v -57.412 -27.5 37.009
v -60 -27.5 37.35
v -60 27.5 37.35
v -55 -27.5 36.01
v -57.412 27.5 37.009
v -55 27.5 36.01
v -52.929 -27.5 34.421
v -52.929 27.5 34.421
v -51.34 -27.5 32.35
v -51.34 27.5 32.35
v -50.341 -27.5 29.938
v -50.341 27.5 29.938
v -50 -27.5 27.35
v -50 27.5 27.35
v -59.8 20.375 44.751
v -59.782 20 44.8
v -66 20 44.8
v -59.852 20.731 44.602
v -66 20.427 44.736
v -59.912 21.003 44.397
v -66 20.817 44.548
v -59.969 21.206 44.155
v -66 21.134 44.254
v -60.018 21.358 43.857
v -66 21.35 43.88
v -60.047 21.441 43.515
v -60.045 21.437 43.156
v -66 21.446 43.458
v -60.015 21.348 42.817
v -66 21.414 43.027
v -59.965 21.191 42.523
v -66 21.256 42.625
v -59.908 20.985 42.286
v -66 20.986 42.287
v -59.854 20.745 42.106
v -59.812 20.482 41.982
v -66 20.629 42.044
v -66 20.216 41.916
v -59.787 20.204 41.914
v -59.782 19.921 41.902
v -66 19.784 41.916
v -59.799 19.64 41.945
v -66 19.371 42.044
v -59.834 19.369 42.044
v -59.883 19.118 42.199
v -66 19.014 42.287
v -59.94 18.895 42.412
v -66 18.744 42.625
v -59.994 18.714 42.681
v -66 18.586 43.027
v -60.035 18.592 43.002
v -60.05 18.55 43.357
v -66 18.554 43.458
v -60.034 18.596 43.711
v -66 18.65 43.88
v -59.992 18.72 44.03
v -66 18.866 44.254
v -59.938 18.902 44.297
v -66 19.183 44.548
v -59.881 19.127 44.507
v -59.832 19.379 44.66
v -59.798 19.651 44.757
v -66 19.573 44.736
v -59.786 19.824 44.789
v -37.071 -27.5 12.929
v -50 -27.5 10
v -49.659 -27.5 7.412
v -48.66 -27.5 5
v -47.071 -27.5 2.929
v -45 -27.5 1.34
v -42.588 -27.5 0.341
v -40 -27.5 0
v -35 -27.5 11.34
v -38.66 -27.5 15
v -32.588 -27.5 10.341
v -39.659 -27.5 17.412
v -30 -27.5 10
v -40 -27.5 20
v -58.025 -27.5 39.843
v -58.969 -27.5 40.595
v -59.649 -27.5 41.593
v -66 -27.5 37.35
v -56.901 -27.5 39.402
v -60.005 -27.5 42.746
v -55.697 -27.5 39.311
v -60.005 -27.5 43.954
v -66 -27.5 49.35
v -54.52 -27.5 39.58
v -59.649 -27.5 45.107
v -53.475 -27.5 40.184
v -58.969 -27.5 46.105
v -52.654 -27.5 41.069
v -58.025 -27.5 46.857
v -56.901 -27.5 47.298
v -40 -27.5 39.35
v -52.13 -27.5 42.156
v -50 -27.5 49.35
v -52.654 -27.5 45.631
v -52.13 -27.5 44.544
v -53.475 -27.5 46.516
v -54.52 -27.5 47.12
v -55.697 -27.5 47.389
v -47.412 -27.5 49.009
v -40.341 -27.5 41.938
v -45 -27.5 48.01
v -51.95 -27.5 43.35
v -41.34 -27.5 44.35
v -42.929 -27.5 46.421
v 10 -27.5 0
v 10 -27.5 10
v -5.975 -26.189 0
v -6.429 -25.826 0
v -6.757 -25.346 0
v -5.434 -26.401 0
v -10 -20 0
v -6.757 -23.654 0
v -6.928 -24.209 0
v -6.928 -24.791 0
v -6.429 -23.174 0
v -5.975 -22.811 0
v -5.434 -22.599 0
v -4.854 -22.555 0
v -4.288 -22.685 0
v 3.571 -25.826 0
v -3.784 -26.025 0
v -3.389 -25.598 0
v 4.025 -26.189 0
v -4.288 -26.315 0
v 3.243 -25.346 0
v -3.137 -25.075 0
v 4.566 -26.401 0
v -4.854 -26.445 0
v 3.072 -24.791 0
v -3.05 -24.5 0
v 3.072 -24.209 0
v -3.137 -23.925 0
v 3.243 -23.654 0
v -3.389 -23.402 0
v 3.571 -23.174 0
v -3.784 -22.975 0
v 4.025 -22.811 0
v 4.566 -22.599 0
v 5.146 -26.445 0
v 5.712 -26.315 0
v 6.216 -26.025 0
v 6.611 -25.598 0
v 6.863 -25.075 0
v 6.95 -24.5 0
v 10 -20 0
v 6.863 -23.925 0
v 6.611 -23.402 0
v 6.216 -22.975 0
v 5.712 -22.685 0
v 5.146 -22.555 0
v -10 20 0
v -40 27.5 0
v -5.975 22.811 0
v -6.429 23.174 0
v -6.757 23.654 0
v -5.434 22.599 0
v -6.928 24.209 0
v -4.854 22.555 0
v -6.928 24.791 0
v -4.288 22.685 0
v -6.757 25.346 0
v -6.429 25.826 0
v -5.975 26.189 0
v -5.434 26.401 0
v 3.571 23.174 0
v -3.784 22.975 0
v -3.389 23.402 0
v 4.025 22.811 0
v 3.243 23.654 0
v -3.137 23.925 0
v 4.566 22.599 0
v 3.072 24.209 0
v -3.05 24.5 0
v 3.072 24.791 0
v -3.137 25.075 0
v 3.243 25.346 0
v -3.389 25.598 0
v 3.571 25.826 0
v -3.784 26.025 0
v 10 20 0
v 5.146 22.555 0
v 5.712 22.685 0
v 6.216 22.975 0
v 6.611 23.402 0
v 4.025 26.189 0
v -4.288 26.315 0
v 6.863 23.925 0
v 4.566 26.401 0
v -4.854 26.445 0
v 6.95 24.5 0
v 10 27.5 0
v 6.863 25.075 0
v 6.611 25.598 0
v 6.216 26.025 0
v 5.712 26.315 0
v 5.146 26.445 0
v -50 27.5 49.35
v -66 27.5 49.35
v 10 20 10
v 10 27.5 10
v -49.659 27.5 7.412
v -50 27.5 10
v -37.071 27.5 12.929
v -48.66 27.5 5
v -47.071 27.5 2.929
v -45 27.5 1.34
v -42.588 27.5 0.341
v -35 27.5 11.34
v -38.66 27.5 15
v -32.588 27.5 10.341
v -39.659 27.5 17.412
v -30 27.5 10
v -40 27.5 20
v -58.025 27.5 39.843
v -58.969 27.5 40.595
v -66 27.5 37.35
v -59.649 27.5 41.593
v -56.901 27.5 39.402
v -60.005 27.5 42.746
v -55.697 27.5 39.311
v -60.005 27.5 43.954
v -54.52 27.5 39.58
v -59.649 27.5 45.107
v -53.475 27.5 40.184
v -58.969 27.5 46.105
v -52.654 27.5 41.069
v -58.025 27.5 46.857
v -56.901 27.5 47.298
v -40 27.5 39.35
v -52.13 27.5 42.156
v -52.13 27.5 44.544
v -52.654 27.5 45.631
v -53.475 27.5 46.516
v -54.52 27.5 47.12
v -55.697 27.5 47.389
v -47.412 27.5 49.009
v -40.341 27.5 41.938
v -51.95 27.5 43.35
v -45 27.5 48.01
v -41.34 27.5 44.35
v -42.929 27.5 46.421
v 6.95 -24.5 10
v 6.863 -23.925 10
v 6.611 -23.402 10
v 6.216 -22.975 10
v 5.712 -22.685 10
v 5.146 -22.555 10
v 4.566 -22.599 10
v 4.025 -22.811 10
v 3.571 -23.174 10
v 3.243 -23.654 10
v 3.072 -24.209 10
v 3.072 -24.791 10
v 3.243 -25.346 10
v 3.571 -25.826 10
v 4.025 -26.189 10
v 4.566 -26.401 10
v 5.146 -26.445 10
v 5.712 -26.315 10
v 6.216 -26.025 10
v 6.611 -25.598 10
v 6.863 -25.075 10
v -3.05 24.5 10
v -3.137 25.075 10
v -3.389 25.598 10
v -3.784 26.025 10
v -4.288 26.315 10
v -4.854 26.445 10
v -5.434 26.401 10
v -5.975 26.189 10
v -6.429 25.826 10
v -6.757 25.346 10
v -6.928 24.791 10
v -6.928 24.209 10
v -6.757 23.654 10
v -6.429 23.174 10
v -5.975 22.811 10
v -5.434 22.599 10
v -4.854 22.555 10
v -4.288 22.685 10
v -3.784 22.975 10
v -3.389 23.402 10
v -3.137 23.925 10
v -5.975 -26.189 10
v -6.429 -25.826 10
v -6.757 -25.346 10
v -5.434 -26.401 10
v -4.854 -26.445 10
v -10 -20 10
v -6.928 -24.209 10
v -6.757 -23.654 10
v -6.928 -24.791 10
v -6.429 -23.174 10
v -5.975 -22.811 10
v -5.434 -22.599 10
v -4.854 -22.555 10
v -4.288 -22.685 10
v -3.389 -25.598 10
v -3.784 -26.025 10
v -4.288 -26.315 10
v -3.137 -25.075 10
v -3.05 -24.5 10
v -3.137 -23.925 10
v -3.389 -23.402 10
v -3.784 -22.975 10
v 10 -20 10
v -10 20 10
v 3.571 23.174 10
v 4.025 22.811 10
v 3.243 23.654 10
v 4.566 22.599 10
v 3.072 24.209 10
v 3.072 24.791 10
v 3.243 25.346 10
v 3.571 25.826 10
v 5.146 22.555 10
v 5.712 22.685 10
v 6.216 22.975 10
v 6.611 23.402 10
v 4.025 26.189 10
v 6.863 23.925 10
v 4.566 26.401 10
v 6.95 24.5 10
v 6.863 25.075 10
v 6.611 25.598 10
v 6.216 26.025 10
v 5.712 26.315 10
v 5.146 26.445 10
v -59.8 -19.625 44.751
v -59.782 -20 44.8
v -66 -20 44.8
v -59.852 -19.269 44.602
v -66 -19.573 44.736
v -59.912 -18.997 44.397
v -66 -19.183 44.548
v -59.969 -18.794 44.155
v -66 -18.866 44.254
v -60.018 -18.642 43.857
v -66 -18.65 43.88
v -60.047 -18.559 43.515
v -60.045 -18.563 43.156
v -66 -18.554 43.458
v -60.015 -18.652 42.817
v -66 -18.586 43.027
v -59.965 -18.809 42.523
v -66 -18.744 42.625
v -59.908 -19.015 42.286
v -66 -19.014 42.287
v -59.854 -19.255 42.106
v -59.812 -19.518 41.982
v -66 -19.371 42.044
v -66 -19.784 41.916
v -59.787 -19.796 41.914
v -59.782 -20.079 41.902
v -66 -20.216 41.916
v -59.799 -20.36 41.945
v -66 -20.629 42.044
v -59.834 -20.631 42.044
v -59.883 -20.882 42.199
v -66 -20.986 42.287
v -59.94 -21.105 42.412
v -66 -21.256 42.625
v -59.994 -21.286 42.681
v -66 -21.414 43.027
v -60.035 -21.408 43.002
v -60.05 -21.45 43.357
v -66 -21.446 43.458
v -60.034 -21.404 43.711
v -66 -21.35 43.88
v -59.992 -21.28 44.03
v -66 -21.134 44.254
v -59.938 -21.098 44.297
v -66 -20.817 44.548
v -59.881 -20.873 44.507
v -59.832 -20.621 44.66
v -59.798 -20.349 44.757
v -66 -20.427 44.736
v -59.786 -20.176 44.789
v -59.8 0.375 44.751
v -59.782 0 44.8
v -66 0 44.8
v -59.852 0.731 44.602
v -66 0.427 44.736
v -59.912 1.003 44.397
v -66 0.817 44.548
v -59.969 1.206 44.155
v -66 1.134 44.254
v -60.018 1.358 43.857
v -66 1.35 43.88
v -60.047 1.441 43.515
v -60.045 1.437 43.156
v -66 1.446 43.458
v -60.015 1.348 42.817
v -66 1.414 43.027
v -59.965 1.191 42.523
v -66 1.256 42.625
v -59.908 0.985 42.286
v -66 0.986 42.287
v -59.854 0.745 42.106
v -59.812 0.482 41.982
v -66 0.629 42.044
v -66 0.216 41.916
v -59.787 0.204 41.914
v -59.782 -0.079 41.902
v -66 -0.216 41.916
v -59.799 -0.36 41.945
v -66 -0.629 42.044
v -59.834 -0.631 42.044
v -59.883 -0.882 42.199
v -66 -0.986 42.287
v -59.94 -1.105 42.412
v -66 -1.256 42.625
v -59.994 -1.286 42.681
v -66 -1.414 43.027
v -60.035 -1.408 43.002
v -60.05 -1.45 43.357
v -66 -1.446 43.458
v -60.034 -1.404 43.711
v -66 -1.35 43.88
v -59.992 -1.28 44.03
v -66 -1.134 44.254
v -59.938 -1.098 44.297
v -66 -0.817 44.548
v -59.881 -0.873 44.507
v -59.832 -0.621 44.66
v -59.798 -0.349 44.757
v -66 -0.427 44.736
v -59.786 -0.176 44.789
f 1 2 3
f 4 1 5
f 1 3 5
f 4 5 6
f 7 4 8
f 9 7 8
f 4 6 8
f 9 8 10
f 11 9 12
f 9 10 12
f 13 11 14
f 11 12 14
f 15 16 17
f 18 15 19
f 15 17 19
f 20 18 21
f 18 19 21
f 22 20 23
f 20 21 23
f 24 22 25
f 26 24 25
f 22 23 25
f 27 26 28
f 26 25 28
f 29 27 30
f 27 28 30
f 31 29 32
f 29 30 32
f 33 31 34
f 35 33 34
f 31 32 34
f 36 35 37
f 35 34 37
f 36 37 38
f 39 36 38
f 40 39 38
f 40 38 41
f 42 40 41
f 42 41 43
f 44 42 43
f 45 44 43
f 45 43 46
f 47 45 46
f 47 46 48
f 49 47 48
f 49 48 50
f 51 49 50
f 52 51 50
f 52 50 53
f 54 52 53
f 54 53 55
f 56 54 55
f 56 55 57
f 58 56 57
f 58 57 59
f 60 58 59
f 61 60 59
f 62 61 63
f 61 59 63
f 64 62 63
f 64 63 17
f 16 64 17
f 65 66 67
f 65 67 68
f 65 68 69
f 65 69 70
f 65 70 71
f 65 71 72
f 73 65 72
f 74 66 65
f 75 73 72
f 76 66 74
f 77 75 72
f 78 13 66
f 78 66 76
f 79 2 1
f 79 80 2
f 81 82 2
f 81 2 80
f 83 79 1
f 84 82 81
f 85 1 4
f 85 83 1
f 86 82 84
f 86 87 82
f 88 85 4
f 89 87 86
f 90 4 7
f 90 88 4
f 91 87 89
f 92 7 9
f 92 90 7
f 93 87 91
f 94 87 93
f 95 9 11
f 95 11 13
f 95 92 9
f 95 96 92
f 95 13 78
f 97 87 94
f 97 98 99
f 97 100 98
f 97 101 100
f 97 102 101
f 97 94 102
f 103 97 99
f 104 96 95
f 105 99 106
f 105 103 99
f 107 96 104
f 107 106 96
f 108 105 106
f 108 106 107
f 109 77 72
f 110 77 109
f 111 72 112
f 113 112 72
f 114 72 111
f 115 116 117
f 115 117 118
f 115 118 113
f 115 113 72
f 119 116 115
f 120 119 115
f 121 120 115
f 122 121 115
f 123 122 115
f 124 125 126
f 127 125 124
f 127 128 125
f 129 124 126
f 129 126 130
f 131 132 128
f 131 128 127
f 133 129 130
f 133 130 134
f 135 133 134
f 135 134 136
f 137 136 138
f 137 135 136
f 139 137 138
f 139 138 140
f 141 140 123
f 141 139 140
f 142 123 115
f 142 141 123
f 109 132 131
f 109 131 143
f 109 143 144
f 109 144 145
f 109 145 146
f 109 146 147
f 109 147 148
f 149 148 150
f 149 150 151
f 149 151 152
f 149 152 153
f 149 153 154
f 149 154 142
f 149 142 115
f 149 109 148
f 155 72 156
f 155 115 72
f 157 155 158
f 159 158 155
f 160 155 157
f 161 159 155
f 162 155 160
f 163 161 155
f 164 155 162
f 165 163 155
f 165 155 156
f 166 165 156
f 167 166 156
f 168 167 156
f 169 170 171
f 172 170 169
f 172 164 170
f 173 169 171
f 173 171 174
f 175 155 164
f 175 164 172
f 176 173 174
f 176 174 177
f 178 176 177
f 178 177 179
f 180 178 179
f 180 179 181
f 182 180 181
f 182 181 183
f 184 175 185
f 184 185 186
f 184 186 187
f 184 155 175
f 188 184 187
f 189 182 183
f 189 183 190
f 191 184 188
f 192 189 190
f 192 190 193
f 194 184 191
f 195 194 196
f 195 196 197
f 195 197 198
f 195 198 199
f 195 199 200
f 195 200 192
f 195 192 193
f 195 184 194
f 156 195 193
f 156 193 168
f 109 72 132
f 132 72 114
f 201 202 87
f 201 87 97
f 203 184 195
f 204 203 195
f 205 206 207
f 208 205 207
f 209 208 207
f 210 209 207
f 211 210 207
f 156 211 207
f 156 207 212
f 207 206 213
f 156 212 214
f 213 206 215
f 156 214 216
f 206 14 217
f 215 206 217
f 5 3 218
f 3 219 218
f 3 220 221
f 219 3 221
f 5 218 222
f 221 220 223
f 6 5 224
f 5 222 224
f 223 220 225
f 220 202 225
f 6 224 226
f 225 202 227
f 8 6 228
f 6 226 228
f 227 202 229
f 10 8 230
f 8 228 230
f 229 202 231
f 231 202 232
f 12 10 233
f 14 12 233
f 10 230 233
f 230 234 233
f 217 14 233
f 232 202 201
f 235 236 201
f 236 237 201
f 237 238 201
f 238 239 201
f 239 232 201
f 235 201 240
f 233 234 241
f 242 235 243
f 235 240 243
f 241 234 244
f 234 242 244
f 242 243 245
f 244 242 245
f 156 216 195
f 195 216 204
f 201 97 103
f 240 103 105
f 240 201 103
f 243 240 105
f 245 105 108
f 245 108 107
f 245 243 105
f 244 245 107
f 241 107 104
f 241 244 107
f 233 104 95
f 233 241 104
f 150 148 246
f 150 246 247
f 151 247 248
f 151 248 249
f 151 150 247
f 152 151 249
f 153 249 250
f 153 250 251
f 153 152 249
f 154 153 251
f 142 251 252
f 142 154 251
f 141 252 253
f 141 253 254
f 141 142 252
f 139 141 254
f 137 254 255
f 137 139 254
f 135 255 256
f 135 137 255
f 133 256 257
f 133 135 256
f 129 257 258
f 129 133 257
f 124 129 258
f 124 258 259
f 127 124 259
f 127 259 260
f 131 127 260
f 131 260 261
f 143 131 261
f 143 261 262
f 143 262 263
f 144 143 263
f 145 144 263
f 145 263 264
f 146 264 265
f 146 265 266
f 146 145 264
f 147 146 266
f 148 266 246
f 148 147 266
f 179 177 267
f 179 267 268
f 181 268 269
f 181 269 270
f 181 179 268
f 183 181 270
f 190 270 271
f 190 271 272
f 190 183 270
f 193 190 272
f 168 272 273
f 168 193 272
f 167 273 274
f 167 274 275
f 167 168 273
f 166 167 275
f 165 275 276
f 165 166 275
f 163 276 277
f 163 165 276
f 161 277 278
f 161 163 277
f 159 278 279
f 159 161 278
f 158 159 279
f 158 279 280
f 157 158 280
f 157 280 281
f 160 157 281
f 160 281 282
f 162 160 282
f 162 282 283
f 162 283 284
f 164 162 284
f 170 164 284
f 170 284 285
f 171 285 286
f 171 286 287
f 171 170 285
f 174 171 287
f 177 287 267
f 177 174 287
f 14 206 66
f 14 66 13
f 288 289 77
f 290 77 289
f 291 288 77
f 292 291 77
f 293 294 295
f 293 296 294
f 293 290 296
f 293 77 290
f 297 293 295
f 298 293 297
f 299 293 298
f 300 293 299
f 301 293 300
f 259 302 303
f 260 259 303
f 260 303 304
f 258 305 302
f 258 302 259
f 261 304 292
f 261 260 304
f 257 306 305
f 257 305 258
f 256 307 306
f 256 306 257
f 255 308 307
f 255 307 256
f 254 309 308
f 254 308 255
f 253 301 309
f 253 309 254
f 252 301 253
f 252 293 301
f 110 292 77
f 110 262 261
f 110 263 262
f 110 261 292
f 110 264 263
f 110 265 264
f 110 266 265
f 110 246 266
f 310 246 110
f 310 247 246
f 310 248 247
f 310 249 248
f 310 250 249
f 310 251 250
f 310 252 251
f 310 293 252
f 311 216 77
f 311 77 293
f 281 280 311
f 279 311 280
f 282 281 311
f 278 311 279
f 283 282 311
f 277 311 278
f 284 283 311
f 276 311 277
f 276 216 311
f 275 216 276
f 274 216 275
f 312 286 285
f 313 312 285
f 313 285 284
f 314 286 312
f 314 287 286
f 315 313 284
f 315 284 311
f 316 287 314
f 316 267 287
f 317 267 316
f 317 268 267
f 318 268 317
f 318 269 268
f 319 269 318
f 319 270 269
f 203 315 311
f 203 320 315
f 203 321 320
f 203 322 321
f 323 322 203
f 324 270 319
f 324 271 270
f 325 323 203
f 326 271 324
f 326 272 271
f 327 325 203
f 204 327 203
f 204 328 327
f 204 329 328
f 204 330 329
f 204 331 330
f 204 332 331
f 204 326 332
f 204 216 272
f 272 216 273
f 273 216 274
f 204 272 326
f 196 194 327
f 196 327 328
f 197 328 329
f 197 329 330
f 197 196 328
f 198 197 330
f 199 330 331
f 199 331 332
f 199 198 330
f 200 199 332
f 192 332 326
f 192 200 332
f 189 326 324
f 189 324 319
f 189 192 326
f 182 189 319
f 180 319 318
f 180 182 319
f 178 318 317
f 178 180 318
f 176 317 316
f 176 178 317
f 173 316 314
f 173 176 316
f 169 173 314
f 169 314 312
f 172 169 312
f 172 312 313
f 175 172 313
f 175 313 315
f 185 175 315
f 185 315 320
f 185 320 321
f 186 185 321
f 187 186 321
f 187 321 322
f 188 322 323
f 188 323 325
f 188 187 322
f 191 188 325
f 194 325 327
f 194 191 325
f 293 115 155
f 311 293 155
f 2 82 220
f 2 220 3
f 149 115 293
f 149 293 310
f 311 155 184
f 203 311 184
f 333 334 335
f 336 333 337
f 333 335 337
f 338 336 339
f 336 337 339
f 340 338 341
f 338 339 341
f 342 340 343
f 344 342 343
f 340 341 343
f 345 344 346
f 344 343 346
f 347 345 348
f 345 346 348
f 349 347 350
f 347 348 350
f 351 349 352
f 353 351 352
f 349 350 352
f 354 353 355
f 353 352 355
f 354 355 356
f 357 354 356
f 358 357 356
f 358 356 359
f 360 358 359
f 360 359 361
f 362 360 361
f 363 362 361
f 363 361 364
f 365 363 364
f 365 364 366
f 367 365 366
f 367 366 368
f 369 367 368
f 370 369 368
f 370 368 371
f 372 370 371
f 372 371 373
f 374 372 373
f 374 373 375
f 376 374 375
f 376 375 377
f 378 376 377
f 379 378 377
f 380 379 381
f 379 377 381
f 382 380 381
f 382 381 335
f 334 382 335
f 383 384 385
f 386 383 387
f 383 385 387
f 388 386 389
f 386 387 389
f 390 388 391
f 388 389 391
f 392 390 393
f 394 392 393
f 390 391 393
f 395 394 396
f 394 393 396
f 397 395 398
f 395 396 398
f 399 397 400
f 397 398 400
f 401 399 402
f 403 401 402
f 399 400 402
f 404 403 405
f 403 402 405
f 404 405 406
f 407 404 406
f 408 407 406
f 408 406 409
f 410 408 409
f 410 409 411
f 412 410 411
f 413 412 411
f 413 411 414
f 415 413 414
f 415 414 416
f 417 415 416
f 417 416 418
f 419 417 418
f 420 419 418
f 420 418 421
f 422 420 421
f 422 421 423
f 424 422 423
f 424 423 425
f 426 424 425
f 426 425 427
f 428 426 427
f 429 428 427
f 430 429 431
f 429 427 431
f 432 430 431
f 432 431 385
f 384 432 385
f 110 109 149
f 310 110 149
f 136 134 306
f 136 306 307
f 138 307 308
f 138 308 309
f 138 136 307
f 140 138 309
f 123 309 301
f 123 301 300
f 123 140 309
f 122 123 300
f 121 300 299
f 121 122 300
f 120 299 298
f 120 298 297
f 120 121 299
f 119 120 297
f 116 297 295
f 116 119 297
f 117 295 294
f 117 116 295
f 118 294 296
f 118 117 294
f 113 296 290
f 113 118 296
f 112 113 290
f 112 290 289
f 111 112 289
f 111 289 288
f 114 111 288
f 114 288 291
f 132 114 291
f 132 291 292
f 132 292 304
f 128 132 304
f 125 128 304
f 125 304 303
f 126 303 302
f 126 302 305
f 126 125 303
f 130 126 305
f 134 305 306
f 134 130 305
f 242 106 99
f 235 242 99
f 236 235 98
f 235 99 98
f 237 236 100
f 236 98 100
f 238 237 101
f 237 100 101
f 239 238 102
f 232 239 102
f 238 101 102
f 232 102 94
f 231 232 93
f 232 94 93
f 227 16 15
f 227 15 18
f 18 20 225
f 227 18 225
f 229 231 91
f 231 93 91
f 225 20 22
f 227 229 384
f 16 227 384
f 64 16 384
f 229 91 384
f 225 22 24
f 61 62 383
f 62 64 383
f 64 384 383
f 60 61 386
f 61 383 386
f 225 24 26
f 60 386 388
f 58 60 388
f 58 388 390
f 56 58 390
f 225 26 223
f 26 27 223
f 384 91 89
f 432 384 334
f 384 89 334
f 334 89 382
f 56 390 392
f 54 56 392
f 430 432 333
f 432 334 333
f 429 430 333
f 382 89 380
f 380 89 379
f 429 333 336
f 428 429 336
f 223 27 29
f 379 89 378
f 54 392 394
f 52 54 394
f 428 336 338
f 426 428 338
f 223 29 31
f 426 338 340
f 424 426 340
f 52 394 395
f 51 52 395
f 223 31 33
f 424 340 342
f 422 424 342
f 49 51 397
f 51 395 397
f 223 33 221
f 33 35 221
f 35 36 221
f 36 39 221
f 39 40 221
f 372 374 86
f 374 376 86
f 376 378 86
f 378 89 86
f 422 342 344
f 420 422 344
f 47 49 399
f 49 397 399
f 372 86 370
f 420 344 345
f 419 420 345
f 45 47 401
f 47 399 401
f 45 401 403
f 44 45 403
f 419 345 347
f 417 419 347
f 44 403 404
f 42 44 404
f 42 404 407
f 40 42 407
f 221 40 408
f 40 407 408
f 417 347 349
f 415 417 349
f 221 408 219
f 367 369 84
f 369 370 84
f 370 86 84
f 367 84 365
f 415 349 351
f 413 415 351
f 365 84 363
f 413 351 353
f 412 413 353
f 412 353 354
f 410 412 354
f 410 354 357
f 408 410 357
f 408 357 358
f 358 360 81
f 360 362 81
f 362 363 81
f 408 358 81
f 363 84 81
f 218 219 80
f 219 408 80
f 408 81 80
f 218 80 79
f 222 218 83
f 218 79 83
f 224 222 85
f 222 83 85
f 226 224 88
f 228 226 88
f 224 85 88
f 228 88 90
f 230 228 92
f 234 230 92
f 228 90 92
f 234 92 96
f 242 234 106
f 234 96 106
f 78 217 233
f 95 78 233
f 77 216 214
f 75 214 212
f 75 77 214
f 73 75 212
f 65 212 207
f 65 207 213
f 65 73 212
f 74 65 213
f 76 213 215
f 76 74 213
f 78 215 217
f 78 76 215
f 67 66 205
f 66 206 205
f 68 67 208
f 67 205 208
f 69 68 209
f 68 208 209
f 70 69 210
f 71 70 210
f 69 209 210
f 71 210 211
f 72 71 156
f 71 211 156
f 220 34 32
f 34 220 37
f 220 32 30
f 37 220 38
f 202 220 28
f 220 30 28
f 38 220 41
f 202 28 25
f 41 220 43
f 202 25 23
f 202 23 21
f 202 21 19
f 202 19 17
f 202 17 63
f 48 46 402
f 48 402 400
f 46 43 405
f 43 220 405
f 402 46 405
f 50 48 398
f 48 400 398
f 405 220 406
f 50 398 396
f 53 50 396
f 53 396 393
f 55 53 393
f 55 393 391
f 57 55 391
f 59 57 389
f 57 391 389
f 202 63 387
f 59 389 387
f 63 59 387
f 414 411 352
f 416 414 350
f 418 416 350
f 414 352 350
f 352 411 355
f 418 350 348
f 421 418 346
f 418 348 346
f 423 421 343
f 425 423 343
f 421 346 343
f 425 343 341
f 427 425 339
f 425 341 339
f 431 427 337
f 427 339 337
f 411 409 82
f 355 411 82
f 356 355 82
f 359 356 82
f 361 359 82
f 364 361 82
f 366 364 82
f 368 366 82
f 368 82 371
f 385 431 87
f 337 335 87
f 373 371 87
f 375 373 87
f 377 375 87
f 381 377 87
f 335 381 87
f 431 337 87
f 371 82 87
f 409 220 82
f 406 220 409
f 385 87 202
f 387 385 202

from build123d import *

# Parameters (mm, degrees)
SKETCH1_W           = 20
SKETCH1_H           = 7.5
SKETCH1_R           = 1.95
BOSS_EXTRUDE2_DEPTH = 10
SKETCH3_W           = 49.35
SKETCH3_H           = 55
BOSS_EXTRUDE3_DEPTH = 10
SKETCH4_W           = 16
SKETCH4_H           = 12
SKETCH4_R           = 4.05
BOSS_EXTRUDE4_DEPTH = 55
SKETCH5_R           = 1.45
CUT_EXTRUDE1_DEPTH  = 10
FILLET1_R           = 10


with BuildPart() as part:
    # Sketch1 → Boss-Extrude2 (new body)
    with BuildSketch(Plane.XY):
        Polygon((-10, 27.5), (-40, 27.5), (-40, -27.5), (-10, -27.5), (-10, -20), (-10, 20), align=None)
        with Locations((0, 23.75)):
            Rectangle(SKETCH1_W, SKETCH1_H)
        with Locations((5, 24.5)):
            Circle(SKETCH1_R, mode=Mode.SUBTRACT)
        with Locations((-5, 24.5)):
            Circle(SKETCH1_R, mode=Mode.SUBTRACT)
        with Locations((0, -23.75)):
            Rectangle(SKETCH1_W, SKETCH1_H)
        with Locations((5, -24.5)):
            Circle(SKETCH1_R, mode=Mode.SUBTRACT)
        with Locations((-5, -24.5)):
            Circle(SKETCH1_R, mode=Mode.SUBTRACT)
    extrude(amount=BOSS_EXTRUDE2_DEPTH)

    # Sketch3 → Boss-Extrude3 (add)
    with BuildSketch(Plane.ZY.offset(40)):
        with Locations((24.675, 0)):
            Rectangle(SKETCH3_W, SKETCH3_H)
    extrude(amount=BOSS_EXTRUDE3_DEPTH)

    # Sketch4 → Boss-Extrude4 (add)
    with BuildSketch(Plane.XZ.offset(27.5)):
        with Locations((-58, 43.35)):
            Rectangle(SKETCH4_W, SKETCH4_H)
        with Locations((-56, 43.35)):
            Circle(SKETCH4_R, mode=Mode.SUBTRACT)
    extrude(amount=-BOSS_EXTRUDE4_DEPTH)

    # Sketch5 → Cut-Extrude1 (cut)
    with BuildSketch(Plane.ZY.offset(66)):
        with Locations((43.35, 20)):
            Circle(SKETCH5_R)
        with Locations((43.35, 0)):
            Circle(SKETCH5_R)
        with Locations((43.35, -20)):
            Circle(SKETCH5_R)
    extrude(amount=-CUT_EXTRUDE1_DEPTH, mode=Mode.SUBTRACT)

    # Fillet1
    fillet1_edges = [part.edges().sort_by_distance(p)[0] for p in [
        (-40, 0, 10),
        (-40, 0, 49.35),
        (-50, 0, 0),
        (-50, 0, 37.35),
    ]]
    fillet(fillet1_edges, radius=FILLET1_R)


solid = part.part
